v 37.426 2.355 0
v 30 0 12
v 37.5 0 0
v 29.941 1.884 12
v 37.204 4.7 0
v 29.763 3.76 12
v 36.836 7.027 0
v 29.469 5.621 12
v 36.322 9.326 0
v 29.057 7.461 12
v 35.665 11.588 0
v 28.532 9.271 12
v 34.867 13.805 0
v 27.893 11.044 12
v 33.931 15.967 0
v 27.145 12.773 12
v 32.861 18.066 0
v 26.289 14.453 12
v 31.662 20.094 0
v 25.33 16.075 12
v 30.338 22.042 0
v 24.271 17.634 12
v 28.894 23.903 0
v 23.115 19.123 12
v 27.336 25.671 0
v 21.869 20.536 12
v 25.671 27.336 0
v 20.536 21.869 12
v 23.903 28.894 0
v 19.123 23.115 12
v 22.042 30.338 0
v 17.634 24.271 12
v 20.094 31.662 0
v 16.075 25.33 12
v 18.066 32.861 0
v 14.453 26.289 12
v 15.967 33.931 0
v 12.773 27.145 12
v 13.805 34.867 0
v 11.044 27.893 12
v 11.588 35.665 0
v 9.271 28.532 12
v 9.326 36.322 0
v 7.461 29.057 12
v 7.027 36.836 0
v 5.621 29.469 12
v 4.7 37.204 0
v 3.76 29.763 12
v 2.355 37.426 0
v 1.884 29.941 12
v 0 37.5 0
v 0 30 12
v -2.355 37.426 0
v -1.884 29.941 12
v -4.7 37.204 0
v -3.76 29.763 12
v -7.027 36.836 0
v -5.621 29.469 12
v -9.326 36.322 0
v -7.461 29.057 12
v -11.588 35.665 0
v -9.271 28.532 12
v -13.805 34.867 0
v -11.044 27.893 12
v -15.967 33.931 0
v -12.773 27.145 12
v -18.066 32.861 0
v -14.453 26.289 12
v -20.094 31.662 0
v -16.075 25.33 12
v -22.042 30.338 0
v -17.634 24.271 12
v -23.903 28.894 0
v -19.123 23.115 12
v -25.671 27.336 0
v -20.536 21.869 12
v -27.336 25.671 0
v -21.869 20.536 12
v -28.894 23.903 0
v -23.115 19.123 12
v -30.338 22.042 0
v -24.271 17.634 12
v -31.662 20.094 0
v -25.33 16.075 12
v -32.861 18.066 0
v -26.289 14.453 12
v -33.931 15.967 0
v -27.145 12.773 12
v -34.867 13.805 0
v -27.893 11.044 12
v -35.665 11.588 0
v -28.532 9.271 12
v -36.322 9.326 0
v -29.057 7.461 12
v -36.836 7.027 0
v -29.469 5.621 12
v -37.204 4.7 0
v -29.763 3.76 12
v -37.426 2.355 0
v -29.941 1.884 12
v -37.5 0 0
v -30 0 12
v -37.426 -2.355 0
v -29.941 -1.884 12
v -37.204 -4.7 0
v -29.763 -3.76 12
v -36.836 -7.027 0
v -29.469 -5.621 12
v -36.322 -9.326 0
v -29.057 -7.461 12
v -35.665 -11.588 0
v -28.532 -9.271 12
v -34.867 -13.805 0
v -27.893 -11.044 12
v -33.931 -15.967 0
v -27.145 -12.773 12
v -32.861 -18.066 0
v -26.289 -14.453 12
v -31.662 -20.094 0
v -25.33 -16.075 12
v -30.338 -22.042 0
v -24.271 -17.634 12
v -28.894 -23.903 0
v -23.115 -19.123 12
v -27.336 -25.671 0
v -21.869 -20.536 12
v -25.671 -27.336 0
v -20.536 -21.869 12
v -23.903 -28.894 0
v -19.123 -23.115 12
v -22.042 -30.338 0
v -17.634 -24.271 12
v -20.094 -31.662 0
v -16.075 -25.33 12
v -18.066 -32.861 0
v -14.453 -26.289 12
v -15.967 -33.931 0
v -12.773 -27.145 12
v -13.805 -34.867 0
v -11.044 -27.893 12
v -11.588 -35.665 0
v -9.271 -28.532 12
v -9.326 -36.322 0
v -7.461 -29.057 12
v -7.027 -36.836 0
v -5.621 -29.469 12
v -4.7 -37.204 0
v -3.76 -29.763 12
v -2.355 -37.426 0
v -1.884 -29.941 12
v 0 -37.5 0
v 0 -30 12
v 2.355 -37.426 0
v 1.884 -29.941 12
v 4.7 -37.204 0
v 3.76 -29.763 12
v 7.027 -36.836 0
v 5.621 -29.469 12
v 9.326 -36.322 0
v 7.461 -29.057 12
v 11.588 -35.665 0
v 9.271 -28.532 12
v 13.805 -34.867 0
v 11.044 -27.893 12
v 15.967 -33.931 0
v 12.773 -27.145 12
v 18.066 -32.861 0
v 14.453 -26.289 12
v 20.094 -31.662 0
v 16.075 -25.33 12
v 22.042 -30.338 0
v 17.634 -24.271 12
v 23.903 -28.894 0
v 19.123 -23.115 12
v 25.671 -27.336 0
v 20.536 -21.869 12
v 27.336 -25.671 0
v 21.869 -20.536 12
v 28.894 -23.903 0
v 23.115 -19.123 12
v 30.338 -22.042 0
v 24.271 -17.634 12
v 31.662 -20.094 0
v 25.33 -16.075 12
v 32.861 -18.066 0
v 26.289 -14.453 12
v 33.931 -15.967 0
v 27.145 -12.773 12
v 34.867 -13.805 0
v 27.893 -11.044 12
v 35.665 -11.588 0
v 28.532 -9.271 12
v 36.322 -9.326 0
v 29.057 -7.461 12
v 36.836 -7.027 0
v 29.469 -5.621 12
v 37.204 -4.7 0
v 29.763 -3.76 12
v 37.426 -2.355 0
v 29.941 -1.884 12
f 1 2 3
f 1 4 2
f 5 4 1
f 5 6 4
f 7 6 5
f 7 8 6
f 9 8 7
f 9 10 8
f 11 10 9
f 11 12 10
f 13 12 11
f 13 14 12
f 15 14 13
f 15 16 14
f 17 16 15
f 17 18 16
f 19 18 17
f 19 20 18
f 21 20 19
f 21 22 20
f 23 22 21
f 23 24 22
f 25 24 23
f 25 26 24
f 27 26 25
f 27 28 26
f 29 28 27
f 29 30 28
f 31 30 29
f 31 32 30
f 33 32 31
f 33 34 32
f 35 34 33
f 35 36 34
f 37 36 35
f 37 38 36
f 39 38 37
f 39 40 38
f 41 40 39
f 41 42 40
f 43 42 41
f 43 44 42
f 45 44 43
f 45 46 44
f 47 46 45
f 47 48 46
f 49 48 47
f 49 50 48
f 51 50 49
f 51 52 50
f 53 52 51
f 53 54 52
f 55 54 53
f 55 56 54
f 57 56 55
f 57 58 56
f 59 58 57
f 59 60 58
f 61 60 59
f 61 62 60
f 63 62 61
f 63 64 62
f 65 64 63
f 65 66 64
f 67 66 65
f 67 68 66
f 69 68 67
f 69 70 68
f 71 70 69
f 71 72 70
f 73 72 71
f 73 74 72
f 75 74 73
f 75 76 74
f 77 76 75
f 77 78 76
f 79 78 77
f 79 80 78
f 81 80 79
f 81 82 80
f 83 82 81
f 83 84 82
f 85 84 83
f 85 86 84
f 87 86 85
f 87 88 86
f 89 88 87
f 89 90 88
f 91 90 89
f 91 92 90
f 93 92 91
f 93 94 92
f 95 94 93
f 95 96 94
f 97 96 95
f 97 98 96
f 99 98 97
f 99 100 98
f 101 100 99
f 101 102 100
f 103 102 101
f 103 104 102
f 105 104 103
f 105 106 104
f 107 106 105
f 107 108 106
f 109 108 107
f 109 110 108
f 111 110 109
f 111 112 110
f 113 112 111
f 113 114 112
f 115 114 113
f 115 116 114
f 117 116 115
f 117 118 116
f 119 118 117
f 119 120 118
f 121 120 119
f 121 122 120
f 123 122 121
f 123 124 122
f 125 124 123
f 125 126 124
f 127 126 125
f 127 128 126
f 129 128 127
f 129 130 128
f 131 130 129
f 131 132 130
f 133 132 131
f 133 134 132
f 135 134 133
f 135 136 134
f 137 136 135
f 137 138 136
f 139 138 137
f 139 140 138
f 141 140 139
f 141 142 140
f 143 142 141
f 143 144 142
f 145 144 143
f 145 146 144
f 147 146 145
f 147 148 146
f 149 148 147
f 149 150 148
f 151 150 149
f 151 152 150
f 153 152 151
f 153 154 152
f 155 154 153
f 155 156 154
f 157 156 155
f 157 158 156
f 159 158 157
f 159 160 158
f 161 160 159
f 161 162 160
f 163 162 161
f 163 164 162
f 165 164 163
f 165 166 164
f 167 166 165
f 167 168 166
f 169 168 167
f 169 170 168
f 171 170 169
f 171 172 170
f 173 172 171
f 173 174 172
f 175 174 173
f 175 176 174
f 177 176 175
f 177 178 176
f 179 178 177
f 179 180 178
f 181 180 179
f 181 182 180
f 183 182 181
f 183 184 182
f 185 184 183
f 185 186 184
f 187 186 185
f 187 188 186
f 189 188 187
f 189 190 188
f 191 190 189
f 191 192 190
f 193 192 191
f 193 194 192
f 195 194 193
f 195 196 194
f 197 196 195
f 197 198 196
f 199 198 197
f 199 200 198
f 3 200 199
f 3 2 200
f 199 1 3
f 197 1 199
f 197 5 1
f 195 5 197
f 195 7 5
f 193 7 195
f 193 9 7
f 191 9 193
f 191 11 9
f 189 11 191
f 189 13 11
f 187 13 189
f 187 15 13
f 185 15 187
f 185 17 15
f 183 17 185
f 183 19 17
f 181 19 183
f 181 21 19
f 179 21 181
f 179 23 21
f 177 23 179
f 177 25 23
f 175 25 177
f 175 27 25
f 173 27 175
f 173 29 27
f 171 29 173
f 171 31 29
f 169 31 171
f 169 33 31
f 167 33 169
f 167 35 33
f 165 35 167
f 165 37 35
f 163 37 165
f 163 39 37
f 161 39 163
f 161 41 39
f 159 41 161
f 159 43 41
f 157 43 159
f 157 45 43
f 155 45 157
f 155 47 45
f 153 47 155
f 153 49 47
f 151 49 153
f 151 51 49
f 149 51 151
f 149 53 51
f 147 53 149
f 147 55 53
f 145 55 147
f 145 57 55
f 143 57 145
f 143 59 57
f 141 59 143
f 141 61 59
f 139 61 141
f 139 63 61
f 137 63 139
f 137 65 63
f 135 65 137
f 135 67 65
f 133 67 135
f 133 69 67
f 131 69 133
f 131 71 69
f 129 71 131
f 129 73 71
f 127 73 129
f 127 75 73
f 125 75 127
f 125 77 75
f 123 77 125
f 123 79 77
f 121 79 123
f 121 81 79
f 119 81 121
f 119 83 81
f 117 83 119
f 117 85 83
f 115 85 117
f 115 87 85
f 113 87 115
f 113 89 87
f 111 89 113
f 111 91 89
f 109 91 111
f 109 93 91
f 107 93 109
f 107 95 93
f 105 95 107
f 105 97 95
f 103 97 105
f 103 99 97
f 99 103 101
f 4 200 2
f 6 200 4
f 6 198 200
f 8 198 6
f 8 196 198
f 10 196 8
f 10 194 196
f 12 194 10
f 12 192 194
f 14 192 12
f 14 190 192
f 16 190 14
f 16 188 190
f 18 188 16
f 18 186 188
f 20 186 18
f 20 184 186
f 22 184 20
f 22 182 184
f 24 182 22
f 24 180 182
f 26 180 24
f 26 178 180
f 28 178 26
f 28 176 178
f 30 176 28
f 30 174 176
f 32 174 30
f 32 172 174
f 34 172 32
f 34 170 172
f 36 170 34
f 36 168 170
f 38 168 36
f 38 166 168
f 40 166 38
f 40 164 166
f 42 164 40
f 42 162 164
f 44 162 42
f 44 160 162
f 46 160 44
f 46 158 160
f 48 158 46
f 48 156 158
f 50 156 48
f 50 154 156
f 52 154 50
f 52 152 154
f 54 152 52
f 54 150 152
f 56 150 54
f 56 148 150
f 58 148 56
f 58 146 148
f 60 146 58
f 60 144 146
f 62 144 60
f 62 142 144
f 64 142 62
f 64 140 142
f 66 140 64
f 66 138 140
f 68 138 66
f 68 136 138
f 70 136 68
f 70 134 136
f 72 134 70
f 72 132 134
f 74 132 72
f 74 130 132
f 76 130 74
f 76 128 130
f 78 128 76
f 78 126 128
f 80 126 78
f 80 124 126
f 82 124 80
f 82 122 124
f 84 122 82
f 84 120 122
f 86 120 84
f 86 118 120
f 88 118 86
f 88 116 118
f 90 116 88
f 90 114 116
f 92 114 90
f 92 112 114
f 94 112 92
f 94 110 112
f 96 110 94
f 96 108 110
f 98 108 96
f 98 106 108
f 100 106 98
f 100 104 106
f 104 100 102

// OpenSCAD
// --- Base Parameters ---
// Modify these values by measuring your real object

top_diameter = 60;    // Width at the top (where the figure sits)
bottom_diameter = top_diameter + 15; // Width at the bottom (on the table)
height = 12;          // Total height of the base

// --- Quality ---
resolution = 100; // Higher number means a smoother circle ($fn)

// --- Model Generation ---
module display_base() {
    // The cylinder function with d1 and d2 creates a truncated cone
    cylinder(
        h = height,
        d1 = bottom_diameter,
        d2 = top_diameter,
        center = false,
        $fn = resolution
    );
}

// Call the function to render the object
color("white")
display_base();
